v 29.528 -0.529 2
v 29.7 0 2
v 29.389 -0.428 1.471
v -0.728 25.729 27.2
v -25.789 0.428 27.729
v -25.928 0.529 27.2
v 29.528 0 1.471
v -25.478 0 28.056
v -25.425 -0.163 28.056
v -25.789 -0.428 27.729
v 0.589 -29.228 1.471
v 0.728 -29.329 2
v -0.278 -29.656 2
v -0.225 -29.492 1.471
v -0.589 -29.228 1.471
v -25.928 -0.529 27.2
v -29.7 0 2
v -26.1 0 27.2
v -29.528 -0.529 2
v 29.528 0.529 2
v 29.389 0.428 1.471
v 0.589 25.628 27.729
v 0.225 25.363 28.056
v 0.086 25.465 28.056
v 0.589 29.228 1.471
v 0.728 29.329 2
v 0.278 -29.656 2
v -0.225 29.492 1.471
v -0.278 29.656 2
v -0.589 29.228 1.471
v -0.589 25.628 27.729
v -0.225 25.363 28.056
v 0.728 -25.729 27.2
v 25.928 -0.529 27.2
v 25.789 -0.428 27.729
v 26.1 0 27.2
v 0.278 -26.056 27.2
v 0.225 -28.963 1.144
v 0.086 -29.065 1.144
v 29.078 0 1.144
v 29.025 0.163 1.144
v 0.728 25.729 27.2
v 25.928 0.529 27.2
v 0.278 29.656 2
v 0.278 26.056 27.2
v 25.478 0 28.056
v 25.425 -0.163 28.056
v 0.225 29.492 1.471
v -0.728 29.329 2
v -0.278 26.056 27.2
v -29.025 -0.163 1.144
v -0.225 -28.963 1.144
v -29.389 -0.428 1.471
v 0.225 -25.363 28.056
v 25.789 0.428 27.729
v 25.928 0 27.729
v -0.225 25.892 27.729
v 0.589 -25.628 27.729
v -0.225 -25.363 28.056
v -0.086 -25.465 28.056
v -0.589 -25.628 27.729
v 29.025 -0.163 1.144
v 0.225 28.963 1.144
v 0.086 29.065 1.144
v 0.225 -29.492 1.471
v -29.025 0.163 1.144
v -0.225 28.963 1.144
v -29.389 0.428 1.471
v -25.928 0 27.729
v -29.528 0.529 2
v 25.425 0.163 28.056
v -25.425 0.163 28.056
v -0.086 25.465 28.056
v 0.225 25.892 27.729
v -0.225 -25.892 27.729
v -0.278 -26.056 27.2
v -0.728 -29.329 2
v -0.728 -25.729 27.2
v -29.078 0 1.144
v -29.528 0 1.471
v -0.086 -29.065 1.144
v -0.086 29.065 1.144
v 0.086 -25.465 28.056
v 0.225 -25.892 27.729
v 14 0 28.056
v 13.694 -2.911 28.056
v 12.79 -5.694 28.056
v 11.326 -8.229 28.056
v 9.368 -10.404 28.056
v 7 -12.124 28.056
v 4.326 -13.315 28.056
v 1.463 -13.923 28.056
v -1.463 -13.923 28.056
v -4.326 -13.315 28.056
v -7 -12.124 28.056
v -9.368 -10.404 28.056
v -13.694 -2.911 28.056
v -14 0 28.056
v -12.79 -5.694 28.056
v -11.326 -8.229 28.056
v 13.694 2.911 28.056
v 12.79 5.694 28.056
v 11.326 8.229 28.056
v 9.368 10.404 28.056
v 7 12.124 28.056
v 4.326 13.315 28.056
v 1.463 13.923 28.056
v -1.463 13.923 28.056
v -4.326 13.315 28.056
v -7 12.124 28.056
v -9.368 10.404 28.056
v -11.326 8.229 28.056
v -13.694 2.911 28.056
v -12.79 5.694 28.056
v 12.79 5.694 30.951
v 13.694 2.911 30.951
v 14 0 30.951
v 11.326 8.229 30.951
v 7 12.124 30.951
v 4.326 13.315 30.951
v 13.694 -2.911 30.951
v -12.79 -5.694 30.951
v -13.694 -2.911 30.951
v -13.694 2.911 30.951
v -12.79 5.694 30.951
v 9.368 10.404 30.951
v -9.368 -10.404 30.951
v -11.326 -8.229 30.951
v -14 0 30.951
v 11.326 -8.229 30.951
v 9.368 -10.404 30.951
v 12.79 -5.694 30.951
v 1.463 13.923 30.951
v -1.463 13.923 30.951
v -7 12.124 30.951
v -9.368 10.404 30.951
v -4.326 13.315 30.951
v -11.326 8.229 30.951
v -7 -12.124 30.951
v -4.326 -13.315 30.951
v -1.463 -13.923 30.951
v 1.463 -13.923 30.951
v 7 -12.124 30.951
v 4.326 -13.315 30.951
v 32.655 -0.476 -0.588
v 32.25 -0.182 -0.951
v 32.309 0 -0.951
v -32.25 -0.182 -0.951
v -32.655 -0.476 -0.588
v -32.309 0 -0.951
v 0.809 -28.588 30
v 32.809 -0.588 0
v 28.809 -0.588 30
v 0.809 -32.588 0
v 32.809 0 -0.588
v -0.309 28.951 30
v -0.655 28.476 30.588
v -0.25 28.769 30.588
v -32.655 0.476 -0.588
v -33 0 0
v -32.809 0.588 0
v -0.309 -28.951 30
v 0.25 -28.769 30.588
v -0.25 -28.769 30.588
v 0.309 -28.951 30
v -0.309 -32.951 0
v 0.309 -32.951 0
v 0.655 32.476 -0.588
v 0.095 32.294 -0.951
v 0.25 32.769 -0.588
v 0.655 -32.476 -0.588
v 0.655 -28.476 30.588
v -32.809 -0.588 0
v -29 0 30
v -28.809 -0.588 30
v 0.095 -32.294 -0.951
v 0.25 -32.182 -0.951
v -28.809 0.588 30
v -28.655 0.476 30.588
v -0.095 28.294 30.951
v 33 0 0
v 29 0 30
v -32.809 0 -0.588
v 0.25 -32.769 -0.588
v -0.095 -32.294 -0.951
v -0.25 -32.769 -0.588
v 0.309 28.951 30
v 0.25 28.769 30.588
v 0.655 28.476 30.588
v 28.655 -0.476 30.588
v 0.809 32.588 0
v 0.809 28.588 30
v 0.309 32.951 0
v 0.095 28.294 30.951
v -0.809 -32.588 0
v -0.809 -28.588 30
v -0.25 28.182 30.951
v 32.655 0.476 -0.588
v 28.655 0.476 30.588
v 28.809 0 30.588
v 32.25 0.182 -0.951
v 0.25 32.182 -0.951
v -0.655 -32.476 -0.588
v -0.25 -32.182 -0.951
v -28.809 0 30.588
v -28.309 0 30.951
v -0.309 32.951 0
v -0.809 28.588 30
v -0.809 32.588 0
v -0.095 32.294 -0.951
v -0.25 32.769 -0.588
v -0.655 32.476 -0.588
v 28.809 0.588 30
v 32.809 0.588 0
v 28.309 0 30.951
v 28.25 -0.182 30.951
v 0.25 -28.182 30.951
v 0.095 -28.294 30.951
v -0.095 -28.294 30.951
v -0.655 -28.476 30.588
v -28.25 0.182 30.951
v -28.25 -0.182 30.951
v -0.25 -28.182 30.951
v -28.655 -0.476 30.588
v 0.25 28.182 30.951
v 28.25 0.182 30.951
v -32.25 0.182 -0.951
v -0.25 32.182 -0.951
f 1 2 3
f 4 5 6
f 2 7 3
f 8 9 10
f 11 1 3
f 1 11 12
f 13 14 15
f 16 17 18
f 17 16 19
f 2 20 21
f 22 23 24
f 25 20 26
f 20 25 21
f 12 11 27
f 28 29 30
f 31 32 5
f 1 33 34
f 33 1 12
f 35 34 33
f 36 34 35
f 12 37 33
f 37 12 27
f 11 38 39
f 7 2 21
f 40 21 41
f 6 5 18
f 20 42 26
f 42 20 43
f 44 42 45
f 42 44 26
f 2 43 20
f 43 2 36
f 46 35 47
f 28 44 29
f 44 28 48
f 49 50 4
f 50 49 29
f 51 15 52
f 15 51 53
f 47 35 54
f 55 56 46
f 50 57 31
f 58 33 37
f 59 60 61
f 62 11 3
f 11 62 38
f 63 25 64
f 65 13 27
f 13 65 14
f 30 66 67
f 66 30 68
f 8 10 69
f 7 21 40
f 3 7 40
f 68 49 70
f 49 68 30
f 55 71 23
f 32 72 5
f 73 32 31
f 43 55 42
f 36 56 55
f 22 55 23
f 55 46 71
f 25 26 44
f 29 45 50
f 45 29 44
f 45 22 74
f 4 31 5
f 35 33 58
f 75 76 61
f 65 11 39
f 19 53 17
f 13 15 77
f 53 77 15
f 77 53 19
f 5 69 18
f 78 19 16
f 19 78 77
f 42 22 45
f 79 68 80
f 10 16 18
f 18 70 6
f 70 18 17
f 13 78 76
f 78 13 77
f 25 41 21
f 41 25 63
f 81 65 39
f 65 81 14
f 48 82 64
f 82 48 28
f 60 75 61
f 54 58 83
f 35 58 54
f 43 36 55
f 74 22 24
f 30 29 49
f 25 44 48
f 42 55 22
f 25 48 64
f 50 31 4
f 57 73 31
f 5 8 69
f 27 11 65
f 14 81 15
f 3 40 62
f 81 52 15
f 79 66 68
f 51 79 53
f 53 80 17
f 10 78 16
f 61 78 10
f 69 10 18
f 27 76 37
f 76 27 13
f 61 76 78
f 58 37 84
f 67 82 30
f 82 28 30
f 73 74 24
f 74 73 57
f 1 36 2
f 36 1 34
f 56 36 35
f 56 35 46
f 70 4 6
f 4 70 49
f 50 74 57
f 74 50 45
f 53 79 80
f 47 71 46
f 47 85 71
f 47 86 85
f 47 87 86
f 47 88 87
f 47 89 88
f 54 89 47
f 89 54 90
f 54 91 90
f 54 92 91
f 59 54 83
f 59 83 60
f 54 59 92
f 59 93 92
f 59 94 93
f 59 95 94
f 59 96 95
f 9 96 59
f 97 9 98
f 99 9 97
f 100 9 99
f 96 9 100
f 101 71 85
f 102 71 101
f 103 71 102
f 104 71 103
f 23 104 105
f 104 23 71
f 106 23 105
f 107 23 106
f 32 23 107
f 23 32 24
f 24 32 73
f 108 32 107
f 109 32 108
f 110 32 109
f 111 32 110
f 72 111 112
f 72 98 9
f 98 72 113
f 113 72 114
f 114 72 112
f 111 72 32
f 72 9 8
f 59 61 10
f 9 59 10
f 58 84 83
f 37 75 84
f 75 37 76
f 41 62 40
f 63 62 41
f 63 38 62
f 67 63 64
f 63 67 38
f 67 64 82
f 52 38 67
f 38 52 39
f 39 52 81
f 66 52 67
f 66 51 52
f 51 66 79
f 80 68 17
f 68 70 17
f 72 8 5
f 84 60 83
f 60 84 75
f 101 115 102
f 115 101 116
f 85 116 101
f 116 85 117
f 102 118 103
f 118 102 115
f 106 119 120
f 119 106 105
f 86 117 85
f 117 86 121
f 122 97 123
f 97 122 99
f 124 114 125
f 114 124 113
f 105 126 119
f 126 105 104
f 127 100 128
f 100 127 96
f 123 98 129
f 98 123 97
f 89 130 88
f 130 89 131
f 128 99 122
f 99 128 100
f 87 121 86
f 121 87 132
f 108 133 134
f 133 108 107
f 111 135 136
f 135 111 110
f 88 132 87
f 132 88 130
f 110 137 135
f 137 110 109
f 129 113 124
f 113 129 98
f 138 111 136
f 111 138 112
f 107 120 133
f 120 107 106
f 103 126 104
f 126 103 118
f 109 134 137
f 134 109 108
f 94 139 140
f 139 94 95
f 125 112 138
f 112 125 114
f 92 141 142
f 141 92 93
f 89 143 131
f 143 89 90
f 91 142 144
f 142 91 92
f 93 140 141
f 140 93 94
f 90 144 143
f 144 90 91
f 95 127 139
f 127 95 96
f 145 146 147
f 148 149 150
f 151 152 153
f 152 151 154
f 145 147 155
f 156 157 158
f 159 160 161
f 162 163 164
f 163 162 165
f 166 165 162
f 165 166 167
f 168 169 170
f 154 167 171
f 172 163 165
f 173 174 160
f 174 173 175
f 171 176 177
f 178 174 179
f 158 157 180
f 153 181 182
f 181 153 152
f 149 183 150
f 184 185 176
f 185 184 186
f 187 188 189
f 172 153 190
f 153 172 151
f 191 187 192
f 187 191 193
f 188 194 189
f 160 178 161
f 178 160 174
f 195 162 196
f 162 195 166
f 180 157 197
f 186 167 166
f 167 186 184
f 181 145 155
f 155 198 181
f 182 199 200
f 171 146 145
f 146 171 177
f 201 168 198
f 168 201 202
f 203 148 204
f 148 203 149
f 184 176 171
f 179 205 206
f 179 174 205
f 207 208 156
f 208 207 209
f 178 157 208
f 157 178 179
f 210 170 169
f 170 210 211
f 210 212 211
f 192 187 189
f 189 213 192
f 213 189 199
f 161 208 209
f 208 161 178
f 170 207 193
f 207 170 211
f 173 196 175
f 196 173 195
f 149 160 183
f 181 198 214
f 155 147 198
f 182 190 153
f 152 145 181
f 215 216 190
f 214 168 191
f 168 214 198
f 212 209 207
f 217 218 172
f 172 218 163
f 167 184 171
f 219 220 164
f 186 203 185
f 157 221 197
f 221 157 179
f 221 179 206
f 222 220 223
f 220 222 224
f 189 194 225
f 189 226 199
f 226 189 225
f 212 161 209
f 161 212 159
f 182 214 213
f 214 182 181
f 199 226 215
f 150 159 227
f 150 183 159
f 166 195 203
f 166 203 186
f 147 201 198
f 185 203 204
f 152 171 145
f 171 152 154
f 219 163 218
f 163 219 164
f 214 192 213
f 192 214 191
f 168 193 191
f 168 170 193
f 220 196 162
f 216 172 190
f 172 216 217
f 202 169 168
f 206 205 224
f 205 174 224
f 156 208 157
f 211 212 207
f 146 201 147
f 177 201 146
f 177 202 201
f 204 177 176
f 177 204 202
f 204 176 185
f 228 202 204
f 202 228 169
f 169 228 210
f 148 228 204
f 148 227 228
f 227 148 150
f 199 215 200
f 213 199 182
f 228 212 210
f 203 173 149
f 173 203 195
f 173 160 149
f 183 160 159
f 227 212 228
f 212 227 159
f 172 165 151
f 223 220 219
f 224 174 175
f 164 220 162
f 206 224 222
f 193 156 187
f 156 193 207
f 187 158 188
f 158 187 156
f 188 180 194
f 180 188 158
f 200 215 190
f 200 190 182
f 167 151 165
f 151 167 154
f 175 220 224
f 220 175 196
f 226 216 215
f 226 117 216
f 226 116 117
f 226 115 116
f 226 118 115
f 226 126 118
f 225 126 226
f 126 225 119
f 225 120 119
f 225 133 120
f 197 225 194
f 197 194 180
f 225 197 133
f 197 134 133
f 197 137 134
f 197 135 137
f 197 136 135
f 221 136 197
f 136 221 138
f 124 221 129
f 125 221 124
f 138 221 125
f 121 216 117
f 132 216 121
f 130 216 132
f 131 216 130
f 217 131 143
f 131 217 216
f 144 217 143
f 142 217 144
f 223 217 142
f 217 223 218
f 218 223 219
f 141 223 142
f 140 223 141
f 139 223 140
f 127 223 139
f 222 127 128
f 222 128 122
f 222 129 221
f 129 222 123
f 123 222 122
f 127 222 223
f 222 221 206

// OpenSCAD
// file: ../../../basics/rounded-edges/rounded-pyramid/rounded-pyramid.scad
/**
 * 
 */
module roundedPyramid(h, r1, r2, cornerRadius, sides=30, sidesOnly=false)
//module roundedPyramid(size, cornerRadius, sides=30, sidesOnly=false)
{
	$fn=sides;
	
	minkowski()//size, cornerRadius)
	{
		cylinder(h=h, r1=r1, r2=r2, $fn=4);
	    
	    if(sidesOnly)
	    {
	    	cylinder(r=cornerRadius);
	    }
	    else
	    {
	    	sphere(r=cornerRadius);
	    	
    	}
	}	
}
// file: ../base/street-lamp-base.scad
use <../../../basics/rounded-edges/rounded-pyramid/rounded-pyramid.scad>

module streetLampBase(switchHole = "no")
{
	height = 30;
	radius1 = 32;
	radius2 = 28;
	sides=10;

	difference()
	{
		streetLampBase_outerShell(height = height,
		radius1 = radius1,
		radius2 = radius2,
		sides = sides);

		streetLampBase_cutouts(height = height, radius1 = radius1, radius2 = radius2, sides = sides, switchHole = switchHole);
	}
}

module streetLampBase_outerShell(height,
radius1,
radius2,
sides)
{
	color("grey")
	roundedPyramid(h = height,
					r1 = radius1,
					r2 = radius2,
					sides = sides,
					sidesOnly=false);
}

module streetLampBase_cutouts(height, radius1, radius2, sides, switchHole)
{
	// main chamber
	xy = radius2 + 13;
	xyTranslate = -xy / 4.0;
	zTranslate = 2.0;
	xyzScale = 0.9;
	outerShellHeight = height - 2;
	translate([0, 0, zTranslate])
	rotate([0, 0, 0])
	scale([xyzScale, xyzScale, xyzScale])
	streetLampBase_outerShell(height = outerShellHeight, radius1 = radius1, radius2 = radius2, sides = sides);

	// top hole
	cutoutRadius = radius2 - 14;
	cutoutHeight = height + 4;
	translate([0, 0, zTranslate])
	cylinder(r = cutoutRadius, h = cutoutHeight);

	if(switchHole == "yes")
	{
		streetLampBase_cutouts_switch();
	}
}

module streetLampBase_cutouts_switch()
{
	xLength = 50;
	yLength = 12;
	yTranslate = -yLength / 2.0;
	zTranslate = 10;
	translate([0, yTranslate, zTranslate])
	rotate([0,0,45])
	cube([xLength, yLength, 5]);
}
// main file
use <../base/street-lamp-base.scad>

showPole = "no"; // [yes, no]

if(showPole == "yes")
{
	%
	translate([0, 0, 29.99])
	import("/home/roberto/Versioning/world/betoland/3d-relization/models/street-lamps/WillemvD/files/StreetLamp.stl");
}

streetLampBase();
